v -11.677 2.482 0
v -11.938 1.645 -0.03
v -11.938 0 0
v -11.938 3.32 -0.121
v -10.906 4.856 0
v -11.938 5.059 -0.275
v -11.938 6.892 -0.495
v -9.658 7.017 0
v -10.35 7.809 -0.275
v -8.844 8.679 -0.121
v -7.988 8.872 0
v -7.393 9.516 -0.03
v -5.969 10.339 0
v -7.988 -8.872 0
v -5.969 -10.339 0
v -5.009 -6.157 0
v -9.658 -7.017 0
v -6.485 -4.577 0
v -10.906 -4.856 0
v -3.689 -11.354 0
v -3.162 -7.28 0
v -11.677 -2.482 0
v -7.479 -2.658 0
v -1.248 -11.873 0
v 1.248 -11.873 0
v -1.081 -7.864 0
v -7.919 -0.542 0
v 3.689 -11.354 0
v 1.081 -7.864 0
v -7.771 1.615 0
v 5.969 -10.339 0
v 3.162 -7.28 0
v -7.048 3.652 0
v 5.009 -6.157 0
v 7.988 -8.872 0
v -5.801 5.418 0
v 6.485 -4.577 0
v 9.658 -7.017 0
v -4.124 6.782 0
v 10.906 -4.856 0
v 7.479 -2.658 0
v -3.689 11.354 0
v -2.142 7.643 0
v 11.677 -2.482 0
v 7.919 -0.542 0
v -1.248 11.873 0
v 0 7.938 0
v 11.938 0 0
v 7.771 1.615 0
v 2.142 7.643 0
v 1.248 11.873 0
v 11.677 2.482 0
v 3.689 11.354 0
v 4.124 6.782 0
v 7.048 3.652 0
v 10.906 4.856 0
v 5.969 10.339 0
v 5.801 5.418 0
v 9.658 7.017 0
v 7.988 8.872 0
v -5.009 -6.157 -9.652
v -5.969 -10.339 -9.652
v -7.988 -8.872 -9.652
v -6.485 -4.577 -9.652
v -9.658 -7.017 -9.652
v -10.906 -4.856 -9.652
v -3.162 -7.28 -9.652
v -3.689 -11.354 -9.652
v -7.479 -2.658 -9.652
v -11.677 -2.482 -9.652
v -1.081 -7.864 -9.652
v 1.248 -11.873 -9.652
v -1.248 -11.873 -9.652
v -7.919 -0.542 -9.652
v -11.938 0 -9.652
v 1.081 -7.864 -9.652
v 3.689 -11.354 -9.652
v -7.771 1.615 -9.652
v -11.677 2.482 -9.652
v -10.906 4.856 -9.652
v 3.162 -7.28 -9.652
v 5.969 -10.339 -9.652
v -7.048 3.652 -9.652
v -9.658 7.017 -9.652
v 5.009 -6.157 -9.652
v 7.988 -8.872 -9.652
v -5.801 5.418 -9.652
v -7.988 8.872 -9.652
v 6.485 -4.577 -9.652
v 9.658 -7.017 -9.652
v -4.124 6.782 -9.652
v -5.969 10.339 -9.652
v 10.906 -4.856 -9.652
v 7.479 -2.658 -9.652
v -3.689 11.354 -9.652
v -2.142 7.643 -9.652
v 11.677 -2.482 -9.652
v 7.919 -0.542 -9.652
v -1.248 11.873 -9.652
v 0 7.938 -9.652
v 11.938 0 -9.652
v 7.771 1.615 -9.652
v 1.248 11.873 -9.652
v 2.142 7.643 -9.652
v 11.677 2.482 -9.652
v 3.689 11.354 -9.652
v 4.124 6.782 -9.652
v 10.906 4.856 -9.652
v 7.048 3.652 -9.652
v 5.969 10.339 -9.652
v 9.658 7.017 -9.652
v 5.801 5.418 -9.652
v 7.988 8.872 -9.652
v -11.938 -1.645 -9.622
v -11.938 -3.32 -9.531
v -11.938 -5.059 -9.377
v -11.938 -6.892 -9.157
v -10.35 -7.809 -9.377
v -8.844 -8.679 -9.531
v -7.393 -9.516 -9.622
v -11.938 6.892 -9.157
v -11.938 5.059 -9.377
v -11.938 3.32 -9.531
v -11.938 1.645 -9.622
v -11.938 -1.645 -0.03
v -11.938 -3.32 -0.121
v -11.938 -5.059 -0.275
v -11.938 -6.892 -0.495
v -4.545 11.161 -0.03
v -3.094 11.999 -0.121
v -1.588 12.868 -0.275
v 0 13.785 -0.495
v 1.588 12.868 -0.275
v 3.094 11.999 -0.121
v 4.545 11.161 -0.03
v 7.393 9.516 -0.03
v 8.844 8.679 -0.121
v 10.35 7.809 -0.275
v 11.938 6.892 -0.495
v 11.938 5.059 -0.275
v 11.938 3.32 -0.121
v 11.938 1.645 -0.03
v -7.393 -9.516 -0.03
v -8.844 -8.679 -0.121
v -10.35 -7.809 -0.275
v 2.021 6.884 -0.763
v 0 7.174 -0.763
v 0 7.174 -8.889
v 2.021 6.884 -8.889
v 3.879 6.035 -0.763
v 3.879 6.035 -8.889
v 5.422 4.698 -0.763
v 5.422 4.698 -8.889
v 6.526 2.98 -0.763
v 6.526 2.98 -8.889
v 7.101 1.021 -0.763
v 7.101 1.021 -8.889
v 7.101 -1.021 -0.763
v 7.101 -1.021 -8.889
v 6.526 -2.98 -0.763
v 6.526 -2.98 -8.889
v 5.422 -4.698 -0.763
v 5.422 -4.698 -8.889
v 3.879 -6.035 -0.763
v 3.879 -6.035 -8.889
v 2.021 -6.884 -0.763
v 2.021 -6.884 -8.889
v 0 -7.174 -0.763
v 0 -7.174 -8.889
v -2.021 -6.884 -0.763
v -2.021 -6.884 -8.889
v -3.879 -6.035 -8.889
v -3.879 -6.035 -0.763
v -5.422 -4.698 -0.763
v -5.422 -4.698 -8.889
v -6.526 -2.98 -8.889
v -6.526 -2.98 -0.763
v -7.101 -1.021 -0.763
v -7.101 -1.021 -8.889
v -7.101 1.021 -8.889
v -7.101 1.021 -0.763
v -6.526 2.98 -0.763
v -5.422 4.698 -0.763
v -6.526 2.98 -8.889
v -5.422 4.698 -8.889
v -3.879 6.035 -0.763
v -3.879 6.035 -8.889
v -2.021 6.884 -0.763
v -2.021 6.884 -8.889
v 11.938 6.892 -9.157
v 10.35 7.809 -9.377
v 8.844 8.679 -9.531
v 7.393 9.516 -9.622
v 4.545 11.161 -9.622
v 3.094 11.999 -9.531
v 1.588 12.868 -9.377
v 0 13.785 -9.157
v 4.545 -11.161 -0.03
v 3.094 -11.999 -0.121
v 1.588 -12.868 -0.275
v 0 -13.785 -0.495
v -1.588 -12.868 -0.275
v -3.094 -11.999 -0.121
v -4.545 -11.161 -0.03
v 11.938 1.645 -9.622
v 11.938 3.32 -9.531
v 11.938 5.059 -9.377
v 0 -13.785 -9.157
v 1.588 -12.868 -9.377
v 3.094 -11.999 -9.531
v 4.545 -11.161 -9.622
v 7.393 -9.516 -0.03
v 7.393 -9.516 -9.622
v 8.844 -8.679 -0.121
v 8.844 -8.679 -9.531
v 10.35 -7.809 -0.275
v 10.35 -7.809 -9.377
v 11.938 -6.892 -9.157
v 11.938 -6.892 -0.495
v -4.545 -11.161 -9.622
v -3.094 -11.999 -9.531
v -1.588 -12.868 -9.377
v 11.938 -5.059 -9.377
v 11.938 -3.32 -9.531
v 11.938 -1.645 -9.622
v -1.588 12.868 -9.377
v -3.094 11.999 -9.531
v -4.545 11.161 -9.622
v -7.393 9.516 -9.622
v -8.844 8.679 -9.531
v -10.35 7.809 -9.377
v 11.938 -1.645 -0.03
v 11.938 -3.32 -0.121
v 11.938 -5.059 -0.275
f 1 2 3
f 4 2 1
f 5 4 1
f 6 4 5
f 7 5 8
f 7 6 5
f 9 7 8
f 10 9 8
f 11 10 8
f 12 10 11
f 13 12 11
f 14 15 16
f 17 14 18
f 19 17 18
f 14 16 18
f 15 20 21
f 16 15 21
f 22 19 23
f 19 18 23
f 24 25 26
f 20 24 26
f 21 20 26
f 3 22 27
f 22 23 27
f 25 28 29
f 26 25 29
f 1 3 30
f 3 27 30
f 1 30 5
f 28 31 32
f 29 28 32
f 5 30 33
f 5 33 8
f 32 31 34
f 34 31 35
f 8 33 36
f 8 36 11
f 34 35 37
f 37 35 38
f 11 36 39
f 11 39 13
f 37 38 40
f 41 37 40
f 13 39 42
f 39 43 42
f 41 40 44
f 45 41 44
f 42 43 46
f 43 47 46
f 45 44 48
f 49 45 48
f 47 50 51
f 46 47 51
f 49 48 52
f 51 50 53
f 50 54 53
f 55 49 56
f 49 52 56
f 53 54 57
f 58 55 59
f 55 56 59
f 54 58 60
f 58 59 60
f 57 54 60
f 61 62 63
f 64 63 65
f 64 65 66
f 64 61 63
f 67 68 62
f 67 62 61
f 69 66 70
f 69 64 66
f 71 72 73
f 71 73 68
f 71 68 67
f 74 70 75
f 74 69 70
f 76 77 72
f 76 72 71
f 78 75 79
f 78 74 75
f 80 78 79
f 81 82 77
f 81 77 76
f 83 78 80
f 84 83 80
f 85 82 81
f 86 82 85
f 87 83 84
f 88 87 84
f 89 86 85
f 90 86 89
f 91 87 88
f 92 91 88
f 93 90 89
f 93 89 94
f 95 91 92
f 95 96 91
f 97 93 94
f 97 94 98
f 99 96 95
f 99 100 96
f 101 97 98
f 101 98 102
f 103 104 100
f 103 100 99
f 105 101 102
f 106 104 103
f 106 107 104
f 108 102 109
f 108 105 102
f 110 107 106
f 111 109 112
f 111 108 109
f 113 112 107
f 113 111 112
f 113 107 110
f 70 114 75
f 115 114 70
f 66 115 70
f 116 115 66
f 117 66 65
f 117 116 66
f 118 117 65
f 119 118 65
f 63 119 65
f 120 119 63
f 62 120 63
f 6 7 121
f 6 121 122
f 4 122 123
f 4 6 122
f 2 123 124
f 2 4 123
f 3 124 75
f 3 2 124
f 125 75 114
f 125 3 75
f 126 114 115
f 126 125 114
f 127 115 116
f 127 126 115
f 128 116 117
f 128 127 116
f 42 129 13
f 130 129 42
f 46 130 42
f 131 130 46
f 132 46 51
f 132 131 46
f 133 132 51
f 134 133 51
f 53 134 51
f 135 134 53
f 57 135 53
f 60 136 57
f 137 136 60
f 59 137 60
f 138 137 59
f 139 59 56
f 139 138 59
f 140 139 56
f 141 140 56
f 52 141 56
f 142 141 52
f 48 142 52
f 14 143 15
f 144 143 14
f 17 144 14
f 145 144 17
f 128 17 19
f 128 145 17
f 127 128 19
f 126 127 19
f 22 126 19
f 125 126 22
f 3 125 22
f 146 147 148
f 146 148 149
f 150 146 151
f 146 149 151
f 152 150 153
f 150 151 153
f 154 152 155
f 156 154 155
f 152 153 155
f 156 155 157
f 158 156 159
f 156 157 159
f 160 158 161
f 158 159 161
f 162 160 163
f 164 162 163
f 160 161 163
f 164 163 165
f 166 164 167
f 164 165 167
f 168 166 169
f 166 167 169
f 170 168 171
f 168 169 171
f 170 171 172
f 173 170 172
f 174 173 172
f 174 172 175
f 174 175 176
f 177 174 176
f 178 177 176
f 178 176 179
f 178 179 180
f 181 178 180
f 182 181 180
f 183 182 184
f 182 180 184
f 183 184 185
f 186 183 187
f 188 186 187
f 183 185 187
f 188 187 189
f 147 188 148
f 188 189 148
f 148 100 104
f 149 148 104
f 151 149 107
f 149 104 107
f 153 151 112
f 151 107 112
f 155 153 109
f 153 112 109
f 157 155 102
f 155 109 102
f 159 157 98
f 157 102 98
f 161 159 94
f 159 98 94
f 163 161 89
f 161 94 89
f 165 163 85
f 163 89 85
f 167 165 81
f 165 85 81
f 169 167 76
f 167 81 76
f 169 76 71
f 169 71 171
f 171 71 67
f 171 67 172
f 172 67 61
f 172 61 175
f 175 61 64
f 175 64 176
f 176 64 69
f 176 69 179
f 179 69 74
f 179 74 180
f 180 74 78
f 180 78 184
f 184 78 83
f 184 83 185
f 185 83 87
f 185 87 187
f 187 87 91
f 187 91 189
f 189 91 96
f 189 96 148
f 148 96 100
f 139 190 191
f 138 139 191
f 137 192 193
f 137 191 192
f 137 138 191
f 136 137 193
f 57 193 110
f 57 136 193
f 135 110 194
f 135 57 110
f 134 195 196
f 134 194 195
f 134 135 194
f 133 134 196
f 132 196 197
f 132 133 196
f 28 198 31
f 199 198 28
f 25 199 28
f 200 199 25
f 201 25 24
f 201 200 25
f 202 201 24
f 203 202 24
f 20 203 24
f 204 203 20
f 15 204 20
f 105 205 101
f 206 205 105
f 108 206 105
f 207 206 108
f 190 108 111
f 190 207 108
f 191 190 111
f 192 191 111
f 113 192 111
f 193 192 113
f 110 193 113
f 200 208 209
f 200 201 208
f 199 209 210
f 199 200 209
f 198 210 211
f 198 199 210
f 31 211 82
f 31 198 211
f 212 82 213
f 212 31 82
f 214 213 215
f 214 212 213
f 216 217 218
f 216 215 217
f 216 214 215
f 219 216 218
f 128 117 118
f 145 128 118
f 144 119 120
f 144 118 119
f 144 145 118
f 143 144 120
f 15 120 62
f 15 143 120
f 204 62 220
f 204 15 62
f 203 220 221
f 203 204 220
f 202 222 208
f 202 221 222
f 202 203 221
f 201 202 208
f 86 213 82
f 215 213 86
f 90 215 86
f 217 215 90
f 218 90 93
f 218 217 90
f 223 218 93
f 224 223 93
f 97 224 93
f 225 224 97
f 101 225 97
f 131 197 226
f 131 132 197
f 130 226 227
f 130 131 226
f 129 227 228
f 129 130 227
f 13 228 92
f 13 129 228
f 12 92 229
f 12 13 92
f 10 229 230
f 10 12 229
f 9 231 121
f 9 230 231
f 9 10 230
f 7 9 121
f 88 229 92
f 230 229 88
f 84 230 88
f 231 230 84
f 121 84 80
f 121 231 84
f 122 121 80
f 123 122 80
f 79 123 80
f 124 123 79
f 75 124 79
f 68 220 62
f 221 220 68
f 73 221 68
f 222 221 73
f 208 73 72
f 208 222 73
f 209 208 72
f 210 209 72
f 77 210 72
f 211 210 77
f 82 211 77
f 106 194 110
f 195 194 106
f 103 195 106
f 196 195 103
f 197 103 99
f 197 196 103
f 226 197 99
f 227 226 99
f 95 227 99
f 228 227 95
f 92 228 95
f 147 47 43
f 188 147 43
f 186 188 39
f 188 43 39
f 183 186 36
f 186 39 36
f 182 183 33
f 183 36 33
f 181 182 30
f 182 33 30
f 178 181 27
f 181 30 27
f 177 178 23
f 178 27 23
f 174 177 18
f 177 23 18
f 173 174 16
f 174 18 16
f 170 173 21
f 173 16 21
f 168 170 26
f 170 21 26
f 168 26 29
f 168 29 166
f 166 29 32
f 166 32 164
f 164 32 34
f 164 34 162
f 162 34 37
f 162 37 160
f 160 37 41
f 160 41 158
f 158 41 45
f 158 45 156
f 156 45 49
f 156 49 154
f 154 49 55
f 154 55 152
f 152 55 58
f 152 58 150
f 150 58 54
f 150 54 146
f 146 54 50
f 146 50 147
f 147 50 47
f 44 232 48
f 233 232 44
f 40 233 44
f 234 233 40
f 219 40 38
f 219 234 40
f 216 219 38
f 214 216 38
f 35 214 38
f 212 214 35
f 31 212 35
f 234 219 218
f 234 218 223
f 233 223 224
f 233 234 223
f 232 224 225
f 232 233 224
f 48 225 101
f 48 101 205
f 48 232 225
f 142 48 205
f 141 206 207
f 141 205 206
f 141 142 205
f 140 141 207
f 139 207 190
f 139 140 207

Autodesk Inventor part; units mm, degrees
sketch "Sketch_8" plane through (0, 0, 0) normal (1, 0, 0) x (0, 1, 0)
  line L0 (0, -9.652) -> (0, 0)
  line L1 (0, 0) -> (11.938, 0)
  line L2 (11.938, 0) -> (14.3256, -0.6398)
  line L3 (14.3256, -0.6398) -> (14.3256, -9.0122)
  line L4 (14.3256, -9.0122) -> (11.938, -9.652)
  line L5 (11.938, -9.652) -> (0, -9.652)
  line L6 (0, -9.652) -> (0, 0)
sketch "Sketch_10" plane through (0, 0, 0) normal (0, 0, 1) x (1, 0, 0)
  line L0 (-23.876, -23.876) -> (23.876, -23.876)
  line L1 (23.876, -23.876) -> (23.876, 23.876)
  line L2 (23.876, 23.876) -> (-23.876, 23.876)
  line L3 (-23.876, 23.876) -> (-23.876, -23.876)
  line L4 (-11.938, -6.8924) -> (0, -13.7848)
  line L5 (0, -13.7848) -> (11.938, -6.8924)
  line L6 (11.938, -6.8924) -> (11.938, 6.8924)
  line L7 (11.938, 6.8924) -> (0, 13.7848)
  line L8 (0, 13.7848) -> (-11.938, 6.8924)
  line L9 (-11.938, 6.8924) -> (-11.938, -6.8924)
revolve "Revolution1" add sketch "Sketch_8" angle 360 about axis through (0, 0, -9.652) along (0, 0, -1)
extrude "Extrusion1" cut sketch "Sketch_10" against normal blind 9.652
sketch "Sketch_11" plane through (0, 0, 0) normal (1, 0, 0) x (0, 1, 0)
  line L0 (0, -9.652) -> (0, 0)
  line L1 (0, 0) -> (7.9375, 0)
  line L2 (7.9375, 0) -> (7.1742, -0.7633)
  line L3 (7.1742, -0.7633) -> (7.1742, -8.8887)
  line L4 (7.1742, -8.8887) -> (7.9375, -9.652)
  line L5 (7.9375, -9.652) -> (0, -9.652)
  line L6 (0, -9.652) -> (0, 0)
revolve "Revolution2" cut sketch "Sketch_11" angle 360 about axis through (0, 0, -9.652) along (0, 0, -1)
thread "Thread1" size "5/8-18 UNF" class "2B" standard "ANSI Unified Screw Threads" full length
ref_plane "NUT_XY" through (0, 0, 0) normal (0, 0, 1) x (1, 0, 0)
ref_plane "NUT_YZ" through (0, 0, 0) normal (1, 0, 0) x (0, 1, 0)
ref_plane "NUT_ZX" through (0, 0, 0) normal (0, 1, 0) x (0, 0, 1)
ref_plane "a1_XY" through (-11.938, 11.938, 0) normal (0, 0, 1) x (1, 0, 0)
ref_plane "a1_YZ" through (-11.938, 11.938, 0) normal (1, 0, 0) x (0, 1, 0)
ref_plane "a1_ZX" through (-11.938, 11.938, 0) normal (0, 1, 0) x (0, 0, 1)
ref_plane "a2_XY" through (11.938, 11.938, 0) normal (0, 0, 1) x (1, 0, 0)
ref_plane "a2_YZ" through (11.938, 11.938, 0) normal (1, 0, 0) x (0, 1, 0)
ref_plane "a2_ZX" through (11.938, 11.938, 0) normal (0, 1, 0) x (0, 0, 1)
ref_plane "b1_XY" through (0, 11.938, 0) normal (1, 0, 0) x (0, 0, -1)
ref_plane "b1_YZ" through (0, 11.938, 0) normal (0, 0, -1) x (0, 1, 0)
ref_plane "b1_ZX" through (0, 11.938, 0) normal (0, 1, 0) x (1, 0, 0)
ref_plane "b2_XY" through (0, 11.938, -9.652) normal (1, 0, 0) x (0, 0, -1)
ref_plane "b2_YZ" through (0, 11.938, -9.652) normal (0, 0, -1) x (0, 1, 0)
ref_plane "b2_ZX" through (0, 11.938, -9.652) normal (0, 1, 0) x (1, 0, 0)
ref_plane "e_XY" through (0, 0, -9.652) normal (1, 0, 0) x (0, 0, -1)
ref_plane "e_YZ" through (0, 0, -9.652) normal (0, 0, -1) x (0, 1, 0)
ref_plane "e_ZX" through (0, 0, -9.652) normal (0, 1, 0) x (1, 0, 0)
ref_plane "ol1_XY" through (0, 0, -11.938) normal (0, 1, 0) x (1, 0, 0)
ref_plane "ol1_YZ" through (0, 0, -11.938) normal (1, 0, 0) x (0, 0, -1)
ref_plane "ol1_ZX" through (0, 0, -11.938) normal (0, 0, -1) x (0, 1, 0)
ref_plane "ol2_XY" through (9.652, 0, -11.938) normal (0, 1, 0) x (1, 0, 0)
ref_plane "ol2_YZ" through (9.652, 0, -11.938) normal (1, 0, 0) x (0, 0, -1)
ref_plane "ol2_ZX" through (9.652, 0, -11.938) normal (0, 0, -1) x (0, 1, 0)
ref_plane "th1_XY" through (0, 7.9375, -9.652) normal (1, 0, 0) x (0, 0, -1)
ref_plane "th1_YZ" through (0, 7.9375, -9.652) normal (0, 0, -1) x (0, 1, 0)
ref_plane "th1_ZX" through (0, 7.9375, -9.652) normal (0, 1, 0) x (1, 0, 0)
ref_plane "th2_XY" through (0, -7.9375, -9.652) normal (1, 0, 0) x (0, 0, -1)
ref_plane "th2_YZ" through (0, -7.9375, -9.652) normal (0, 0, -1) x (0, 1, 0)
ref_plane "th2_ZX" through (0, -7.9375, -9.652) normal (0, 1, 0) x (1, 0, 0)
properties part number "D-9" material "Steel, Galvanized"
